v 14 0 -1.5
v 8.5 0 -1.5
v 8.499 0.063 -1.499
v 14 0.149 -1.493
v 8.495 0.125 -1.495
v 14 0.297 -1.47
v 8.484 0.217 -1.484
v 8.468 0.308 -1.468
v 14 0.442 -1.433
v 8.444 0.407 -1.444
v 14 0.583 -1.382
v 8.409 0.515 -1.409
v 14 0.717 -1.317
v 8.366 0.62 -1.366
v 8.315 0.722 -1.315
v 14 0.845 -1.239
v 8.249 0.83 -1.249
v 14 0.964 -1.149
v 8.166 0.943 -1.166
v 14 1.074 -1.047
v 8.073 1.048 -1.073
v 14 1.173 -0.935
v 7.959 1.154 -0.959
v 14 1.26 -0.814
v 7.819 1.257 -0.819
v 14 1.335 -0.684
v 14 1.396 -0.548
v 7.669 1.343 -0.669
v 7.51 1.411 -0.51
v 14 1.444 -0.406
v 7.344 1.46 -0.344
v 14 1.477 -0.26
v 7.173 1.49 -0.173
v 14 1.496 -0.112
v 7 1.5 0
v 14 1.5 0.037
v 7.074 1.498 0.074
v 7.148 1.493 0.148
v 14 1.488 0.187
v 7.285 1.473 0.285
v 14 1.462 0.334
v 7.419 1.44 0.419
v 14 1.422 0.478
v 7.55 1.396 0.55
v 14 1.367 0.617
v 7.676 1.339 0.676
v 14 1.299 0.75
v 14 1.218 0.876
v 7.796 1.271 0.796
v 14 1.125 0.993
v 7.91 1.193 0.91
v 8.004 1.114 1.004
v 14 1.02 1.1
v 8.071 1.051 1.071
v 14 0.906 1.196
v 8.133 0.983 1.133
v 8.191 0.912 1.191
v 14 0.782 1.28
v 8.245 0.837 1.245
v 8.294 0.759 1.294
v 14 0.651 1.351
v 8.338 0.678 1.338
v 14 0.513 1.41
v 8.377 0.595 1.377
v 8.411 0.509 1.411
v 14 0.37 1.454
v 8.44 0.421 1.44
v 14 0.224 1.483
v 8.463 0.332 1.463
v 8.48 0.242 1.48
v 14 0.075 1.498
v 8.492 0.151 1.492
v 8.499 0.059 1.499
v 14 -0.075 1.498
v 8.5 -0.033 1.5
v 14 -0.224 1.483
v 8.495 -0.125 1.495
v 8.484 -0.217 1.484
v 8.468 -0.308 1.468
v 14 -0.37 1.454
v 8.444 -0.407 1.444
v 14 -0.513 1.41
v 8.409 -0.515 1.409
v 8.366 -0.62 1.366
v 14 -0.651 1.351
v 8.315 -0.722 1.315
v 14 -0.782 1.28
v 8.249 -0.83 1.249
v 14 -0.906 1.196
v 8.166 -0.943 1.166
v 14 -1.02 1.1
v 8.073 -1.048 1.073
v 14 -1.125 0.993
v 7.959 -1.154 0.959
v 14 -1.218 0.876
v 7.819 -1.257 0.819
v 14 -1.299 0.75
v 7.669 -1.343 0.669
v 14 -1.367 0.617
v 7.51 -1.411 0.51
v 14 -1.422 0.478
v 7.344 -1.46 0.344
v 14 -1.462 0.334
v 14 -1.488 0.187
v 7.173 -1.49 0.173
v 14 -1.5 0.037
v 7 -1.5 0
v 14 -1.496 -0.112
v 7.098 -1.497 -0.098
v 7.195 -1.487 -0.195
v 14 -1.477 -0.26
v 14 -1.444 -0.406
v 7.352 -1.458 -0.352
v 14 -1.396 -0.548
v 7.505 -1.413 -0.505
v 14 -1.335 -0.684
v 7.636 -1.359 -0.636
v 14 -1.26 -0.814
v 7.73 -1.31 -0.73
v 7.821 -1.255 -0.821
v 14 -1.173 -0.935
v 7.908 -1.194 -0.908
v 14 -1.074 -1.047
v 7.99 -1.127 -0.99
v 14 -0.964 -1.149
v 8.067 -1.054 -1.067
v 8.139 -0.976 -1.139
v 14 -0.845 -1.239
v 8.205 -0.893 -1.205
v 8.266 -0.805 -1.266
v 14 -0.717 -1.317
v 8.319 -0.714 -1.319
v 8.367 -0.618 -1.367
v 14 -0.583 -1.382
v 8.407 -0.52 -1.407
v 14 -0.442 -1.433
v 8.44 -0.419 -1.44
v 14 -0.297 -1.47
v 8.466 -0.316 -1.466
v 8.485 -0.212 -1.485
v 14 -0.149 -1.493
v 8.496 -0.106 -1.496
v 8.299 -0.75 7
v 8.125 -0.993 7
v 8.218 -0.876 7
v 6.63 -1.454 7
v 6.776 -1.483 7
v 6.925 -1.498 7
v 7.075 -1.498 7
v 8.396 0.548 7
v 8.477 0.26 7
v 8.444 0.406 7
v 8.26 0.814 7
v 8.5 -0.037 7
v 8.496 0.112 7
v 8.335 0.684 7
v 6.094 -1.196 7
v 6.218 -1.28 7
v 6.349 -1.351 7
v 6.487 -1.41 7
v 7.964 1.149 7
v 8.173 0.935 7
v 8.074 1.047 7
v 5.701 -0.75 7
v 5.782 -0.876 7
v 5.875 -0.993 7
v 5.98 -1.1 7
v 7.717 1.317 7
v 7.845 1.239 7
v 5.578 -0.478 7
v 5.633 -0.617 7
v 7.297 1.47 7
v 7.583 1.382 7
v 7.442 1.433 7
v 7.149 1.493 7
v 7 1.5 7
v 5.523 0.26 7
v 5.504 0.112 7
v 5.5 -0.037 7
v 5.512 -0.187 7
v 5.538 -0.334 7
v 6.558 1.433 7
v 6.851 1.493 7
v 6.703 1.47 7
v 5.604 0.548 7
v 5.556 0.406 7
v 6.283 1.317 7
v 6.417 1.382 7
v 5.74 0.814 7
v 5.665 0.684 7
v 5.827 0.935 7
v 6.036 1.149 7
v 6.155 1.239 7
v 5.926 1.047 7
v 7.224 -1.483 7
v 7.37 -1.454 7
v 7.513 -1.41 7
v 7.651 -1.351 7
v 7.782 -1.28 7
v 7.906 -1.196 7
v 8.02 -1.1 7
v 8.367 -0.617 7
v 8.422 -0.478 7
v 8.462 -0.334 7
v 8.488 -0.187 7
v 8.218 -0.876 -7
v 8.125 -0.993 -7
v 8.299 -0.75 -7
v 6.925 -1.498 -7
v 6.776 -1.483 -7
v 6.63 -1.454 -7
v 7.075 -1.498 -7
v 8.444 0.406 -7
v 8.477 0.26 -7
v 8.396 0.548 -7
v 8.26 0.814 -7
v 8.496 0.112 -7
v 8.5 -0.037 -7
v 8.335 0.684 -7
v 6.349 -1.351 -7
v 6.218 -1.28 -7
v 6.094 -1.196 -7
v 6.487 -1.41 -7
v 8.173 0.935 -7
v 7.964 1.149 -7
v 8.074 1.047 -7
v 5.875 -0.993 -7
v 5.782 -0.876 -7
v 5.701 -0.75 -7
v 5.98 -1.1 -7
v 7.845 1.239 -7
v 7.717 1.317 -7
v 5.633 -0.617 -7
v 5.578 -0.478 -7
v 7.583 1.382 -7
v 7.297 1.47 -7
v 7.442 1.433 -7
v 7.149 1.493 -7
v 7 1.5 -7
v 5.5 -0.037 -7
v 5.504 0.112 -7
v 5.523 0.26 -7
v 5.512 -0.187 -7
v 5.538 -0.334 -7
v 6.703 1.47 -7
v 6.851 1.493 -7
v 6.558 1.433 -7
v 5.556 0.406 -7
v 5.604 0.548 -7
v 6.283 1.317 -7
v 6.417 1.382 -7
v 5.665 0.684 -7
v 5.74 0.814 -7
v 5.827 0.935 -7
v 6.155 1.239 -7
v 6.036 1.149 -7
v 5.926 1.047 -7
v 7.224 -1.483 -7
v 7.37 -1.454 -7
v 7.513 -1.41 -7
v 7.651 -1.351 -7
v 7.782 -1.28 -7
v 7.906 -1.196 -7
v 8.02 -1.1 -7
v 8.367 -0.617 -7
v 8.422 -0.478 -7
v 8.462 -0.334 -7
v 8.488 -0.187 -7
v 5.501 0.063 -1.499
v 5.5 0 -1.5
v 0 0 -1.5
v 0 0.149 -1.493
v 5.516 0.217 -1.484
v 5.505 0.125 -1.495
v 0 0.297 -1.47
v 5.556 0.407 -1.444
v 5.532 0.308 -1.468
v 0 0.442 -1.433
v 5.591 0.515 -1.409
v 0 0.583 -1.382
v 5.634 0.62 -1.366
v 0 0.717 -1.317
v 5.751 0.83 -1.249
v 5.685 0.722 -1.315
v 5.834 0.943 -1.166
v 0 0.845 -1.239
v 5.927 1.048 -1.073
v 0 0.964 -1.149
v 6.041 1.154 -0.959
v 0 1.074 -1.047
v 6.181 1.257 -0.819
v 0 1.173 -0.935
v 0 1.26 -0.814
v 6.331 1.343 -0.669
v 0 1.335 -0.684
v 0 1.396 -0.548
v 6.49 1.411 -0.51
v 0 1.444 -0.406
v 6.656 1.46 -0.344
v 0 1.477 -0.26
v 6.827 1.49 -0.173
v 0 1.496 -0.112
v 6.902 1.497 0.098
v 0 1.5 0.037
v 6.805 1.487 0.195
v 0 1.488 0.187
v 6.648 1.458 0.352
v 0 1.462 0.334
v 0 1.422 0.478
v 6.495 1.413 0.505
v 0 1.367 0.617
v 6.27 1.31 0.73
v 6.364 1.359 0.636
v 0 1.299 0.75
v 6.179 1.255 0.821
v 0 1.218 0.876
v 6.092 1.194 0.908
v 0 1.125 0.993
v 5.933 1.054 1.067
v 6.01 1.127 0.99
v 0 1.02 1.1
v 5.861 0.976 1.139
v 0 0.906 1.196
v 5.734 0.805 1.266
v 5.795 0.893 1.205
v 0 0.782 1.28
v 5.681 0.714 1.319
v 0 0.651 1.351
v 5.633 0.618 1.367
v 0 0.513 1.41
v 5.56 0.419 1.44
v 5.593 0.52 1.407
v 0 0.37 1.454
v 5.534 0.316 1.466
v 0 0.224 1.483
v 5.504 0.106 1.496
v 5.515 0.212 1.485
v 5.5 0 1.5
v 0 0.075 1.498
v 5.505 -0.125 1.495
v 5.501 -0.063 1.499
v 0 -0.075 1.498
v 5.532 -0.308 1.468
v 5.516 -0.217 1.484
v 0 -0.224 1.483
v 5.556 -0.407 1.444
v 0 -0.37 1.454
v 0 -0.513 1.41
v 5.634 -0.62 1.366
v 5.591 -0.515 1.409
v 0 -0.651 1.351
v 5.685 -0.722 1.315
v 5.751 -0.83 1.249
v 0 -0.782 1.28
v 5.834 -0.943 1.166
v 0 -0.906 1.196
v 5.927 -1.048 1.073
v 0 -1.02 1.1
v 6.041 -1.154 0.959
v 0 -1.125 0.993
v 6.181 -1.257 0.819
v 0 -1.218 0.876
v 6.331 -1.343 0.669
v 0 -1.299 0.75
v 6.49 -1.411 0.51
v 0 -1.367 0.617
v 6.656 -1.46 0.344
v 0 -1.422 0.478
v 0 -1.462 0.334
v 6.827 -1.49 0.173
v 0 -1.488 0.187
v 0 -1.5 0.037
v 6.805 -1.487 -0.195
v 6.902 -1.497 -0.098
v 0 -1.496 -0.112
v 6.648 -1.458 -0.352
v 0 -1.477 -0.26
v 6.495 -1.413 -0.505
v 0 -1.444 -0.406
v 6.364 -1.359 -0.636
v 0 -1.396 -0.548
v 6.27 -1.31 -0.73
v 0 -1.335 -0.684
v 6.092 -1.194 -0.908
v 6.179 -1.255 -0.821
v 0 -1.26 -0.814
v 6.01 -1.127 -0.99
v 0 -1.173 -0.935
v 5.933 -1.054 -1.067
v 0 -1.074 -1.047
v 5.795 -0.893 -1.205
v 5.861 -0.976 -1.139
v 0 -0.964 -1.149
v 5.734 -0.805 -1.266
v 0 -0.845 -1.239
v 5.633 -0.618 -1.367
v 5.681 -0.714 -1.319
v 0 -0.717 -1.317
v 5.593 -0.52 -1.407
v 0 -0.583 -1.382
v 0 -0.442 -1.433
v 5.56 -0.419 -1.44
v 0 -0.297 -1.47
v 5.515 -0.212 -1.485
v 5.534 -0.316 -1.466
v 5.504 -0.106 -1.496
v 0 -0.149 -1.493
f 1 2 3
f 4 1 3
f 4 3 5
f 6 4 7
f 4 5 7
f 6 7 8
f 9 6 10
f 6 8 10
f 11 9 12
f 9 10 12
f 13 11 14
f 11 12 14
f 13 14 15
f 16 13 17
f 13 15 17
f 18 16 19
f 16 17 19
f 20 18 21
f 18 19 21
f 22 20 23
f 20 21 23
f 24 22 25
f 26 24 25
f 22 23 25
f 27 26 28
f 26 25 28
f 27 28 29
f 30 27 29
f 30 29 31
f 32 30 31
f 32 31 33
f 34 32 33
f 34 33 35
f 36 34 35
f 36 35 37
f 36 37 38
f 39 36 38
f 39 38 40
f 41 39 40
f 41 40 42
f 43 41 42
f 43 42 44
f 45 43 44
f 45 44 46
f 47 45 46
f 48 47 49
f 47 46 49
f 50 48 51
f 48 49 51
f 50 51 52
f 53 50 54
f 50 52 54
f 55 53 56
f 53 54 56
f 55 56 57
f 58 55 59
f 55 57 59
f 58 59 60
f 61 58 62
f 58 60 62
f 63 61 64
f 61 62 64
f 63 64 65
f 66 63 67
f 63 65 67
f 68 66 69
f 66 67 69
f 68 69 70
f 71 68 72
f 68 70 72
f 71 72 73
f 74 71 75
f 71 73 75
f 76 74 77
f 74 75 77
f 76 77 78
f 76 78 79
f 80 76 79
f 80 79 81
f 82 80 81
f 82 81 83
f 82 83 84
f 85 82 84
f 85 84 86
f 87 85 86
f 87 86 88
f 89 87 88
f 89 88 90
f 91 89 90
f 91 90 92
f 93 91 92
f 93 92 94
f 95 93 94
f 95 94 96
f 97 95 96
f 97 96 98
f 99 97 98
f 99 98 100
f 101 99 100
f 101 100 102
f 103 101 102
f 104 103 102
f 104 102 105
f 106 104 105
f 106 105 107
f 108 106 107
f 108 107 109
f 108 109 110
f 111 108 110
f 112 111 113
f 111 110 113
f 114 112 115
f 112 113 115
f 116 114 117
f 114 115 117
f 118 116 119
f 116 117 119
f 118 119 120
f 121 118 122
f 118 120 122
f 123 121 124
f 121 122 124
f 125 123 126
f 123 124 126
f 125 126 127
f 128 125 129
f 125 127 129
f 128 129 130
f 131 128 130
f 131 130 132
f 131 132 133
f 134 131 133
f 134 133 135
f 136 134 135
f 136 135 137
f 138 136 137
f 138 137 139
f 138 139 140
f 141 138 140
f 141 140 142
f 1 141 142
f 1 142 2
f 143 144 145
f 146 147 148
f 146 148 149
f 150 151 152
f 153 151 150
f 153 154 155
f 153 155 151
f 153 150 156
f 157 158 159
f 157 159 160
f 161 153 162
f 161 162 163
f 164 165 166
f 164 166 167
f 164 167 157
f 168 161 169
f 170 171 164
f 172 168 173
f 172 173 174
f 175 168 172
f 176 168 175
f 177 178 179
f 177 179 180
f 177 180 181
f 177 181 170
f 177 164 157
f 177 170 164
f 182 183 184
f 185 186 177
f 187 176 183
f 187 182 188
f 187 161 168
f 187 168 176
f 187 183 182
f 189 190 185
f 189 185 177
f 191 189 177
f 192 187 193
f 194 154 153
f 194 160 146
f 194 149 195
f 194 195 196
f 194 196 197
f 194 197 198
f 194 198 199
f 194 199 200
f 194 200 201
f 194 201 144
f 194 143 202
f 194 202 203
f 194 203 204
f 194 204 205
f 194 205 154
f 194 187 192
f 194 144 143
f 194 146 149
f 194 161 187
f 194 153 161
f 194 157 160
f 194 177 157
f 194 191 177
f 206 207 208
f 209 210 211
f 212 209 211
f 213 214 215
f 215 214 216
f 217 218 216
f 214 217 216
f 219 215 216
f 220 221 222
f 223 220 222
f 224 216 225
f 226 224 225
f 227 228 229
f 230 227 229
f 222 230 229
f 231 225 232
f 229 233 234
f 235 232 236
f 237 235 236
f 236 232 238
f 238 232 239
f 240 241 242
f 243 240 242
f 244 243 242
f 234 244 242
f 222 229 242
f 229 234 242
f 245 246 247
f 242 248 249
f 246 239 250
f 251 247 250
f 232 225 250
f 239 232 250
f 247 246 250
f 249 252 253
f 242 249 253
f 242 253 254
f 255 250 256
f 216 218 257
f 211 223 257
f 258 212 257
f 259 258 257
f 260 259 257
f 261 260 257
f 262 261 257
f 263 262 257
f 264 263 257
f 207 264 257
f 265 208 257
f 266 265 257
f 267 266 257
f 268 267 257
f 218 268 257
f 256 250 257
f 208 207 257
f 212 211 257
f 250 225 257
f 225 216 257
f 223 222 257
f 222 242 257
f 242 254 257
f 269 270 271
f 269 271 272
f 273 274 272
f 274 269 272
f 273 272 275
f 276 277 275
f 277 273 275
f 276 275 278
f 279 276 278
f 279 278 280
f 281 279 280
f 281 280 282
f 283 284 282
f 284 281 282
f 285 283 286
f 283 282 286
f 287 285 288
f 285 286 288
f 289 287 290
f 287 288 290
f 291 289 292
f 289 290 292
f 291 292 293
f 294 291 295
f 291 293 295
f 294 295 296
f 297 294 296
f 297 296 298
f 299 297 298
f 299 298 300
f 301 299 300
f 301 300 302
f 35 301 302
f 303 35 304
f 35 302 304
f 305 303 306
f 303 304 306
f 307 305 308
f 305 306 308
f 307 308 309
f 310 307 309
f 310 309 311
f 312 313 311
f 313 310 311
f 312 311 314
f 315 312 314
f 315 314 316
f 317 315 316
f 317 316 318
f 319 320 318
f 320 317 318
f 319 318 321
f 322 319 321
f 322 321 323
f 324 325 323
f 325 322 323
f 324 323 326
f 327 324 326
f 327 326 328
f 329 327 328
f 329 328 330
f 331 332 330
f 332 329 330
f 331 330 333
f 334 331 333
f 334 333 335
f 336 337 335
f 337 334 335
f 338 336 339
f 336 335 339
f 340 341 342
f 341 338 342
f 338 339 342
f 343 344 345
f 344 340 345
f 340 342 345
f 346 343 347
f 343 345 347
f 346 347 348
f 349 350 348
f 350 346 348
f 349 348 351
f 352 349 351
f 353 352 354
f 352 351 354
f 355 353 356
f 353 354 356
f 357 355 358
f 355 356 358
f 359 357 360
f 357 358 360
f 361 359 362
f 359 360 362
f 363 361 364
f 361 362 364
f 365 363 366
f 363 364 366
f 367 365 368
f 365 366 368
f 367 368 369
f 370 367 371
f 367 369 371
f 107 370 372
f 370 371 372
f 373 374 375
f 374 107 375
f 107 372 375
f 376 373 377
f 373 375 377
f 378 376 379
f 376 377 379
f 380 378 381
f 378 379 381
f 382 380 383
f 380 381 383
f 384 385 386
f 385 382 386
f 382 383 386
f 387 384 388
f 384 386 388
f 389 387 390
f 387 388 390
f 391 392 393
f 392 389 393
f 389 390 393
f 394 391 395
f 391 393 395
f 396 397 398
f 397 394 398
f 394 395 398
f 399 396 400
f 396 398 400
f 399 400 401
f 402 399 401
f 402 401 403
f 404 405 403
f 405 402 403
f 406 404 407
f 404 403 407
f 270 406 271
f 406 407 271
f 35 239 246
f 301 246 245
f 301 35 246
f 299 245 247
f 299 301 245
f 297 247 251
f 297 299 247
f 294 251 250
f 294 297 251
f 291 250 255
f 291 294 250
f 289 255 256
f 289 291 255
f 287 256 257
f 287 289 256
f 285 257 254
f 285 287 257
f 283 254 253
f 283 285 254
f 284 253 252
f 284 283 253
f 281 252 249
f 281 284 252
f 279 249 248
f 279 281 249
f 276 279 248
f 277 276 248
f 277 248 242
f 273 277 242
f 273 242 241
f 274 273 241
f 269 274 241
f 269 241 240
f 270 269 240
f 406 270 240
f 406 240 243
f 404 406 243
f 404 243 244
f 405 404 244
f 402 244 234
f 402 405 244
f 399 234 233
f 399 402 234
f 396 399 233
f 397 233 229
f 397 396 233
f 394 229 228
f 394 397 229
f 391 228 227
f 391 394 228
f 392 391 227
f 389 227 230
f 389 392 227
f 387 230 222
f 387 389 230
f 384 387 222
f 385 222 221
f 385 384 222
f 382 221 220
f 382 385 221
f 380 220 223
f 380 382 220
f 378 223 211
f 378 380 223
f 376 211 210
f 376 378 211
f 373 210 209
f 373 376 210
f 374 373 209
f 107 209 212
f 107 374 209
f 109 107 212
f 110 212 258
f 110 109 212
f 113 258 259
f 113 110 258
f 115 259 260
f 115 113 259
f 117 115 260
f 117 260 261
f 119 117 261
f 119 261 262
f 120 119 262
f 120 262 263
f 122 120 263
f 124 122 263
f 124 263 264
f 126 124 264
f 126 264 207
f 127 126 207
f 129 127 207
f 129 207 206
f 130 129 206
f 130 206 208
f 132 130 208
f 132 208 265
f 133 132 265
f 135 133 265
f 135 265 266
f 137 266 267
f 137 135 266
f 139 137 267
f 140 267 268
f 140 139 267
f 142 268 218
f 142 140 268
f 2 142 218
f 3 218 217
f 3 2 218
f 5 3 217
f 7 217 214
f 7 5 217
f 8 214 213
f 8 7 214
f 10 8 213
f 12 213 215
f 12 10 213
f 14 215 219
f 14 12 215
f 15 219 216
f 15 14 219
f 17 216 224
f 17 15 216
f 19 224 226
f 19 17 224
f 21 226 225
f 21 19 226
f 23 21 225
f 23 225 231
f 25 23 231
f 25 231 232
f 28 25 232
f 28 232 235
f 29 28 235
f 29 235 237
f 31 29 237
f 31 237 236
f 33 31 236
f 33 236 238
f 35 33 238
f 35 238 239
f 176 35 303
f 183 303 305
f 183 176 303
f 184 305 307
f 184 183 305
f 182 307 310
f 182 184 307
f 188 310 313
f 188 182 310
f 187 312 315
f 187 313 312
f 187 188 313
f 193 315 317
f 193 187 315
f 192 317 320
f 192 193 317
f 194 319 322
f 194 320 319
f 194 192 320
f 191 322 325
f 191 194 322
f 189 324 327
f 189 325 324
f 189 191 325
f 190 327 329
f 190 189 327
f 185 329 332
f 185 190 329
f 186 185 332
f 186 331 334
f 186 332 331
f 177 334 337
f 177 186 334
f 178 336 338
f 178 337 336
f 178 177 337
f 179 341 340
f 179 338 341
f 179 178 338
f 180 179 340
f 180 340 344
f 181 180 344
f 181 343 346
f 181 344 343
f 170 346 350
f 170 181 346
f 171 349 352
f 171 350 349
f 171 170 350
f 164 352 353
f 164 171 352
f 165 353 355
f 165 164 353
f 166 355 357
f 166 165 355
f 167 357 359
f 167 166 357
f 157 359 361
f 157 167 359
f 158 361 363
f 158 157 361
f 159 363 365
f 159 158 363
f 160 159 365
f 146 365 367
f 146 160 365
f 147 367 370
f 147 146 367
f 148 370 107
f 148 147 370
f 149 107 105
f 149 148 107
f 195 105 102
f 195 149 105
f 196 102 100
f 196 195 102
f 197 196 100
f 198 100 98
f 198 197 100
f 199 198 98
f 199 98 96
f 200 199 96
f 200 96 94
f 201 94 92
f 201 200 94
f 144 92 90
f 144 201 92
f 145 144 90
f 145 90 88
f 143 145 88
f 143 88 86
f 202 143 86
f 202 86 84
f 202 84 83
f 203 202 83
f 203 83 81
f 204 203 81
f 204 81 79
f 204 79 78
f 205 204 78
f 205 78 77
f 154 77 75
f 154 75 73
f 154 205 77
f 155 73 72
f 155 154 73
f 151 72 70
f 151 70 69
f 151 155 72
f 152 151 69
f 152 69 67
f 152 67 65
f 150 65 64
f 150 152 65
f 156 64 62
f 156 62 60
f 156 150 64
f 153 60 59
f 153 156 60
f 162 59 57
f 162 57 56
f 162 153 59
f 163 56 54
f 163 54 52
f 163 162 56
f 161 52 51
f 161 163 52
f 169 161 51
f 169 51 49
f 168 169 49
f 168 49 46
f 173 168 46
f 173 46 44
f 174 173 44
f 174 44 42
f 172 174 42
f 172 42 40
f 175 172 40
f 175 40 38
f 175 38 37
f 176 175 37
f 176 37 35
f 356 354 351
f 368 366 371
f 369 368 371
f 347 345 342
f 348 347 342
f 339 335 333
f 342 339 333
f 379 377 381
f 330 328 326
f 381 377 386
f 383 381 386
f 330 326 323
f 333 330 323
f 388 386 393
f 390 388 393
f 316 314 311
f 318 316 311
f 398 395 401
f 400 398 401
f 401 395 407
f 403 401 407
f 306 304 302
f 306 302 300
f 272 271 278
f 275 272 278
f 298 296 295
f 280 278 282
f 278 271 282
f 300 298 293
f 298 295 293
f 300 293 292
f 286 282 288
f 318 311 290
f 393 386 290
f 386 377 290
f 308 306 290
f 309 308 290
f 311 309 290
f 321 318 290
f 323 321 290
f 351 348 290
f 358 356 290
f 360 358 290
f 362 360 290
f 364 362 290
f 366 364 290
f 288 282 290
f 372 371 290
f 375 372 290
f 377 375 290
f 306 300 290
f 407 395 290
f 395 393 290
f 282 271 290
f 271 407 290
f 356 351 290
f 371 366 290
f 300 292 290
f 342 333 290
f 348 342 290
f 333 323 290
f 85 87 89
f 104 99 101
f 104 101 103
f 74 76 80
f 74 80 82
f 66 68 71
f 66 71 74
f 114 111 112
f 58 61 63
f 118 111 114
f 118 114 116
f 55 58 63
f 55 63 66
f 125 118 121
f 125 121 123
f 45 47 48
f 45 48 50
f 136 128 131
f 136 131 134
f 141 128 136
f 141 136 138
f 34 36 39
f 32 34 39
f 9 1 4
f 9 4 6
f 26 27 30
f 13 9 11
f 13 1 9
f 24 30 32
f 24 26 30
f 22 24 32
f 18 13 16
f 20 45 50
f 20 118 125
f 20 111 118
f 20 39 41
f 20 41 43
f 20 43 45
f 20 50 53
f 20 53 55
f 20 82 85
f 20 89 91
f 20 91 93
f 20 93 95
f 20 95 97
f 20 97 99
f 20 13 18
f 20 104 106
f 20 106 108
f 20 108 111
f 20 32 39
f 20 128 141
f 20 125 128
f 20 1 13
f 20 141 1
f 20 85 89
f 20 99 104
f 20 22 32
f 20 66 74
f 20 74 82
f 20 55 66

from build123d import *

# Parameters (mm, degrees)
SKETCH_1_R      = 1.5
EXTRUDE_1_DEPTH = 14
SKETCH_2_R      = 1.5
EXTRUDE_2_DEPTH = 7


with BuildPart() as part:
    # 草图1 → 凸台-拉伸1 (new body)
    with BuildSketch(Plane(origin=(0, 0, 0), x_dir=(0, 0, -1), z_dir=(1, 0, 0))):
        Circle(SKETCH_1_R)
    extrude(amount=EXTRUDE_1_DEPTH)

    # 草图2 → 凸台-拉伸2 (add, symmetric)
    with BuildSketch(Plane.XY):
        with Locations(Location((7, 0, 0), (0, 0, 90))):
            Circle(SKETCH_2_R)
    extrude(amount=EXTRUDE_2_DEPTH, both=True)


solid = part.part
